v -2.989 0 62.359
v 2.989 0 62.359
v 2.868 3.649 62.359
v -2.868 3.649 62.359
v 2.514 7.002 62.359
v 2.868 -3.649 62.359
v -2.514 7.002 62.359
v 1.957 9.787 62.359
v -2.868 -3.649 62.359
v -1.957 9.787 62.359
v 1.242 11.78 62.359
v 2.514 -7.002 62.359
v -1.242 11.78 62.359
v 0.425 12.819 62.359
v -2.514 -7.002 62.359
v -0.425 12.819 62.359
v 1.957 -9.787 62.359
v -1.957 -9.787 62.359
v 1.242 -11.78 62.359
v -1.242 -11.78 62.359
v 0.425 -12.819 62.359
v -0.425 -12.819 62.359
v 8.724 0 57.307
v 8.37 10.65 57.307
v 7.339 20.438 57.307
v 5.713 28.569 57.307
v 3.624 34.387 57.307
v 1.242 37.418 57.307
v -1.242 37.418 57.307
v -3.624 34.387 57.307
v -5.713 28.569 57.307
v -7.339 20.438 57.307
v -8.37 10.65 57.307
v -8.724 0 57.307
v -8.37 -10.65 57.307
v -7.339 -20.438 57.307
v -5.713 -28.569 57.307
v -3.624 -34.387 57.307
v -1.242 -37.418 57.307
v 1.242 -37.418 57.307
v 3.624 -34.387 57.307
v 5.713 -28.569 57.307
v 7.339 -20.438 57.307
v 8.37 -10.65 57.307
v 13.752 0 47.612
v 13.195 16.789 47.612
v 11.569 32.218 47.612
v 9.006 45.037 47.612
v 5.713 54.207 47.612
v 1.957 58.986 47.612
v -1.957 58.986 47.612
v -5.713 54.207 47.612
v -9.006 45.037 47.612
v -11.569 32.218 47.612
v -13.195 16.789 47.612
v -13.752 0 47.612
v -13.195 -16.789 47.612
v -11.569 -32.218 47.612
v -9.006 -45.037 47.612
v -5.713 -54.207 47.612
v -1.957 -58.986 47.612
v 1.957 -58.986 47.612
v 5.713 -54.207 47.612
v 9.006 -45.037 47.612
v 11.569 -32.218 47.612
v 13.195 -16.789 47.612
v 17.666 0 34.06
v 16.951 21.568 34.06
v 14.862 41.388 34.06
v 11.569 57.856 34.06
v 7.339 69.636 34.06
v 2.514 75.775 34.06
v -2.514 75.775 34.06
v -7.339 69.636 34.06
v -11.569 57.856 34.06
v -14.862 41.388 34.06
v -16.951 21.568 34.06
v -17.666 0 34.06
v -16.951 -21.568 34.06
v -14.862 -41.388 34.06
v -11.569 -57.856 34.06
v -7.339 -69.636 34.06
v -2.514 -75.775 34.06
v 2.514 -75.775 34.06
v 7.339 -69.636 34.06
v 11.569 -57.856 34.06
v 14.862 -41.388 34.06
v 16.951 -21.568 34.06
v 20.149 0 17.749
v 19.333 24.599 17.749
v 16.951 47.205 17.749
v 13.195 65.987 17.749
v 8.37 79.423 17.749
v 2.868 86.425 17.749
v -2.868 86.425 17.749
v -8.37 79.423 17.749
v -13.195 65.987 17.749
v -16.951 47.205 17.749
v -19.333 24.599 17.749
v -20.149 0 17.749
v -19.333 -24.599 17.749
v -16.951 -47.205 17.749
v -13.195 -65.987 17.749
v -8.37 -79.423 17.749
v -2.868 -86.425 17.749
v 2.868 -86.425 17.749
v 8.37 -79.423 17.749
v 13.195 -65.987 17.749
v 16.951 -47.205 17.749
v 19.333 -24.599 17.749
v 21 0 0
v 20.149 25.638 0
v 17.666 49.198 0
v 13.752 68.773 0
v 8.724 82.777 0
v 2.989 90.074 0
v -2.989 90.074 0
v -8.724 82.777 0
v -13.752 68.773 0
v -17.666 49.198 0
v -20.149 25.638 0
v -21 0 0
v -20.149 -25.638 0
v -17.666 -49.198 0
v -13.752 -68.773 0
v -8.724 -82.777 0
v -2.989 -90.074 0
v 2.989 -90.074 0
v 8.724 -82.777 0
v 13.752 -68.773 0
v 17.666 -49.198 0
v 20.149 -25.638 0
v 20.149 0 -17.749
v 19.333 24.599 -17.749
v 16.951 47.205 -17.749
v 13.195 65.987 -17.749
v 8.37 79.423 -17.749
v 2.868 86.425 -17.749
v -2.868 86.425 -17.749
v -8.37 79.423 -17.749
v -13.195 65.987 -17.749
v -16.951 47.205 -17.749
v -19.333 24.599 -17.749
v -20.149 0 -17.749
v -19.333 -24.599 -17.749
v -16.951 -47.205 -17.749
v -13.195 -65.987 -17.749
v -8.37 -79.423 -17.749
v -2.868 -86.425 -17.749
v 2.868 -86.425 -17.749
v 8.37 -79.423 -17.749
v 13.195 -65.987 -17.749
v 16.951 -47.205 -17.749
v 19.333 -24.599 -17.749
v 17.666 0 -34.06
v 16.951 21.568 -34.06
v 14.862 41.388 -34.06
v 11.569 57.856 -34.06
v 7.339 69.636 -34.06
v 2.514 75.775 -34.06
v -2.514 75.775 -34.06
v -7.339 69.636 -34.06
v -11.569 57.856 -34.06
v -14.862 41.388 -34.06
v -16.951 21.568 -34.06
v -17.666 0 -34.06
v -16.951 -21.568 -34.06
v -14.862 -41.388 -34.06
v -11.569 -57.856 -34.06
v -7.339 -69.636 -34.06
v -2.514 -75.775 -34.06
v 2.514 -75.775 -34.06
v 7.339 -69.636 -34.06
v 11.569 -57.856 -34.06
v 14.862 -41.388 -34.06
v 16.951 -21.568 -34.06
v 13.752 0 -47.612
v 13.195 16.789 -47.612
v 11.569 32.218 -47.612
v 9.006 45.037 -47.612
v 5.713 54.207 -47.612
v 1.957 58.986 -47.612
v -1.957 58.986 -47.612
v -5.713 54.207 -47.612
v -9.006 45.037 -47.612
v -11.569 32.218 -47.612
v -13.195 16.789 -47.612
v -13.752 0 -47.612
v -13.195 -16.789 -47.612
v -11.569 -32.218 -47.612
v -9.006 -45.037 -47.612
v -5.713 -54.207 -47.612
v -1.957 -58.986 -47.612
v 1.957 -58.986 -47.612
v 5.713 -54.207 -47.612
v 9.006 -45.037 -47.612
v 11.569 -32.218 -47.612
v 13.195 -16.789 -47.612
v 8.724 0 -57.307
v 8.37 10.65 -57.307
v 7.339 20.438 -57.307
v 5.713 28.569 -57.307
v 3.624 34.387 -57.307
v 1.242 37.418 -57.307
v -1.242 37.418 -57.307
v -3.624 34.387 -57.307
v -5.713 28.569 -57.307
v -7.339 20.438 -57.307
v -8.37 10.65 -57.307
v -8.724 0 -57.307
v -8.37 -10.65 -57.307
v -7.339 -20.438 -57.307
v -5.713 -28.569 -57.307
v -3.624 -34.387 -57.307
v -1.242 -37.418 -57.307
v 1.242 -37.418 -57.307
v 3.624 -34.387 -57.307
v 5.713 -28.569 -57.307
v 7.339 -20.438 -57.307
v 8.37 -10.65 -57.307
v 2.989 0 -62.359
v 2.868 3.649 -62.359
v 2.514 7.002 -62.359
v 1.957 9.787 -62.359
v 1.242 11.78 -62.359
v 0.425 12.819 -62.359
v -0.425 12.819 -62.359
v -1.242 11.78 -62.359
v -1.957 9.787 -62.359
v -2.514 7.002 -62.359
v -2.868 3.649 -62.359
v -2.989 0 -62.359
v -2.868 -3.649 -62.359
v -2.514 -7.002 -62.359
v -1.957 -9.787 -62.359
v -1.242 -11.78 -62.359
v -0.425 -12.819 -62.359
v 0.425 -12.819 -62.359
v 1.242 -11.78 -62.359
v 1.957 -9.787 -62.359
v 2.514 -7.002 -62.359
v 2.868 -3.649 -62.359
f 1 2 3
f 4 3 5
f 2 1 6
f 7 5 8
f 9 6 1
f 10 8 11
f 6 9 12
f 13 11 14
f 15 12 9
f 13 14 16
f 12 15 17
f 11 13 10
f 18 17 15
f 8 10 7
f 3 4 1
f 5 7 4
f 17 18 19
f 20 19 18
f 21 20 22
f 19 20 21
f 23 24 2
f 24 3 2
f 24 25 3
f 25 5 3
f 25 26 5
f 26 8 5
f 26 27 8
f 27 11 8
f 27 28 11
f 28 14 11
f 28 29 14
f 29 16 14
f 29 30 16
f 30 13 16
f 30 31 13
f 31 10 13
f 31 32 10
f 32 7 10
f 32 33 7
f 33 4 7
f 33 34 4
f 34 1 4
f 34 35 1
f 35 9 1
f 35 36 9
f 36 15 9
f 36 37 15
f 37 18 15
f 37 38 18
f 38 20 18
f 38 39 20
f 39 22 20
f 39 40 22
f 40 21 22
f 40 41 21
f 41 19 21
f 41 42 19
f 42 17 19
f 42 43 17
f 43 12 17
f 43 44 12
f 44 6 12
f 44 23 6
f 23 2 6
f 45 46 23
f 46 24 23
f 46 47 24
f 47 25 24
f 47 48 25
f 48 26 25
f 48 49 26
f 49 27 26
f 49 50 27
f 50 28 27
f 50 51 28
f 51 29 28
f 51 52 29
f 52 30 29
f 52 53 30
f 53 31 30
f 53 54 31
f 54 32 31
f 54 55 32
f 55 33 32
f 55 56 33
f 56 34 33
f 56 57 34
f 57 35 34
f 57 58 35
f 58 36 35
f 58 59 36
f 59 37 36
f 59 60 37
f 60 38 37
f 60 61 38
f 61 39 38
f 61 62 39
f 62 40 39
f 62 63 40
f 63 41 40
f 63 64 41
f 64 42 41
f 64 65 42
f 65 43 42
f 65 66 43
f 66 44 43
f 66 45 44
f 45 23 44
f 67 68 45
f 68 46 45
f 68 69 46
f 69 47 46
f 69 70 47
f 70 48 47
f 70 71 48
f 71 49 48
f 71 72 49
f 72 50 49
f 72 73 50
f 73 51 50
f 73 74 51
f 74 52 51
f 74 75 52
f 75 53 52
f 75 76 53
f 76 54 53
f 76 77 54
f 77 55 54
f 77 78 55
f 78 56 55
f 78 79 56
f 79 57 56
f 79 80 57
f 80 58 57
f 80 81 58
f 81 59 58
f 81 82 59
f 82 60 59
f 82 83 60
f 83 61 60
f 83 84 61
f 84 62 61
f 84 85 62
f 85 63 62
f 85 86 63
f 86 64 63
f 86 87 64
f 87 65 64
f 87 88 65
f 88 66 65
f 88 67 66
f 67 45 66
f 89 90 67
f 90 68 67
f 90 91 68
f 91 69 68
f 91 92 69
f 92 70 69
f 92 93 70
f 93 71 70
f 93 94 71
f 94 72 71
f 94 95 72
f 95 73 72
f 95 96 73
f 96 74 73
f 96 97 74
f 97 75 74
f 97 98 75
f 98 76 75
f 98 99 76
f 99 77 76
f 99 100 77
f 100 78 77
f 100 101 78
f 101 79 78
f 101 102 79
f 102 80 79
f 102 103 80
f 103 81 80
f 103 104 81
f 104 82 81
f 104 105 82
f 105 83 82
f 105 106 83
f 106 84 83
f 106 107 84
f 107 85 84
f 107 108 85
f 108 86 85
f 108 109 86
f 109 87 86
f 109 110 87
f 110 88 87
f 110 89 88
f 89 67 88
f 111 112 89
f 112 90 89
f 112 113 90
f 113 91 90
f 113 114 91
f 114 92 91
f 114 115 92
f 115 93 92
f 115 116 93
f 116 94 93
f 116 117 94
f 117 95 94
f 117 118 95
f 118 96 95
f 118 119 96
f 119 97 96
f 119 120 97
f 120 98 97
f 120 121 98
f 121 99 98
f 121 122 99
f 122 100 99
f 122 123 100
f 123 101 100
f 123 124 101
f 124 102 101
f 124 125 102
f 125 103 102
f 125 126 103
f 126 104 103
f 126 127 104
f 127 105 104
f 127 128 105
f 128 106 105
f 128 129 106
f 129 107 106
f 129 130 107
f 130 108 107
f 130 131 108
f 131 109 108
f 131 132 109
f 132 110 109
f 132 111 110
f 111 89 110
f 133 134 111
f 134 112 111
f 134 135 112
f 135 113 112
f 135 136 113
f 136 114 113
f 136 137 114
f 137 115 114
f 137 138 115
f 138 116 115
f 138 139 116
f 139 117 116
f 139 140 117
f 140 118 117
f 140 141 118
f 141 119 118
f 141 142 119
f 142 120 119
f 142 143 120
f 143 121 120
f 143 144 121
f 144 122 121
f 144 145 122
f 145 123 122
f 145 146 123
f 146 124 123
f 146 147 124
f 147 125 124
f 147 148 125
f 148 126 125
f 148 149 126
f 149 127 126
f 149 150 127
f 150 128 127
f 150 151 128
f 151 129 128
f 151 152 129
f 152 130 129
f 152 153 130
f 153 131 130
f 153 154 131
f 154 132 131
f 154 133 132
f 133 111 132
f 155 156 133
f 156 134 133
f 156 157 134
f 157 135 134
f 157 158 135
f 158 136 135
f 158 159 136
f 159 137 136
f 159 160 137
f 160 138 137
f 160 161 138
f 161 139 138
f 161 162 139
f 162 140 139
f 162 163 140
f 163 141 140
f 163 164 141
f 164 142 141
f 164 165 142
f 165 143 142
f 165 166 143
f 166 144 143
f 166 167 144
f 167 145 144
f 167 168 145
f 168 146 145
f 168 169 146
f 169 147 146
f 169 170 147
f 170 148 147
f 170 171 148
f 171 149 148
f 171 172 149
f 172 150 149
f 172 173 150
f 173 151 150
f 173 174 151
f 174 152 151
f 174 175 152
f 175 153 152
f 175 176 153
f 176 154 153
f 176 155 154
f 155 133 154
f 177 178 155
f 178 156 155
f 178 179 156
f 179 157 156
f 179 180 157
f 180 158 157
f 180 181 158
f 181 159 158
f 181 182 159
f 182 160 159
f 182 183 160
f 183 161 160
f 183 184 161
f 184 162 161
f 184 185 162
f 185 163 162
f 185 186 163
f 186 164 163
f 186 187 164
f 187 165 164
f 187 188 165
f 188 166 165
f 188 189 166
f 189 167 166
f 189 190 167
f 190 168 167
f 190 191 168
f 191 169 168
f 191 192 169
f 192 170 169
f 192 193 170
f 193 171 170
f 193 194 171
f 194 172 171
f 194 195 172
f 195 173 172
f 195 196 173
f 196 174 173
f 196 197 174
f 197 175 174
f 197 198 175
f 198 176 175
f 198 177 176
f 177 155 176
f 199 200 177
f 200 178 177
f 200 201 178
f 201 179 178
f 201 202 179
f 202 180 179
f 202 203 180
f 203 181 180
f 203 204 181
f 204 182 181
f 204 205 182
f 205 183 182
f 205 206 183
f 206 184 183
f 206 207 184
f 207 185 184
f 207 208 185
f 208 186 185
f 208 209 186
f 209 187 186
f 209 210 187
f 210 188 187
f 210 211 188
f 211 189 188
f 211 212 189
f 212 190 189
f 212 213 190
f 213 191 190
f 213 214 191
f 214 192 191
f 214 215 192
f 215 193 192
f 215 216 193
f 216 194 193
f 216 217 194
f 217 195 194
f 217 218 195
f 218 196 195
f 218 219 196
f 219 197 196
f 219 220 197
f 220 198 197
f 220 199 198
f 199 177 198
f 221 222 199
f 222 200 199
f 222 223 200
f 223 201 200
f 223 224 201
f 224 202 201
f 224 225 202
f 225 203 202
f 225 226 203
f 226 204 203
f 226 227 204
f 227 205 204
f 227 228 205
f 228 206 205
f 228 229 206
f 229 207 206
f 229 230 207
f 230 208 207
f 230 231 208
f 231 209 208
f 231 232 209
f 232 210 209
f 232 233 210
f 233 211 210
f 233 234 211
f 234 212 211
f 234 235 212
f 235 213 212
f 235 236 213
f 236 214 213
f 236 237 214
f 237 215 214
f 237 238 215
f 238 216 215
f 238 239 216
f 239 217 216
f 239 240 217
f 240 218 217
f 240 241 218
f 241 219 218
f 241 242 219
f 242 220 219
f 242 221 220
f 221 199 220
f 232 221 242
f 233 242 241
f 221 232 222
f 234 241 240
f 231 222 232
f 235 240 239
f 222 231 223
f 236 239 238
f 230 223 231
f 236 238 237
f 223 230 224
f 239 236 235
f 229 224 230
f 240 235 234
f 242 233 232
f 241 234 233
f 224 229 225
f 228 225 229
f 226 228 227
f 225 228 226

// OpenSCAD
// Generated by SolidPython 1.0.1 on 2020-07-29 00:46:45


scale(v = [3, 13, 9]) {
	sphere(r = 7);
}
/***********************************************
*********      SolidPython code:      **********
************************************************
 
# import packages: SolidPython
from solid import *
from solid.utils import *
from itertools import chain, combinations, permutations


class Resize:

    def __init__(self, scad_file):
        self.scad_file = scad_file
        #self.scad_file = import_scad(scad_file)
        # cone/cylinder param:
        self.r1 = 0
        self.r2 = 0
        self.h = 0
        # rectangular prism param:
        self.w = 0
        self.l = 0
        # ellipse param:
        self.r = 0

    # import OpenScad code (file name corresponds to shape)


    # classify shape + parameters
    def assign(self, param1, param2, param3):
        if self.scad_file == 'cone.scad':
            self.r1 = param1
            self.r2 = param2
            self.h = param3
        elif self.scad_file == 'cylinder.scad':
            self.r1 = param1
            self.r2 = param2
            self.h = param3
        elif self.scad_file == 'rectangularPrism.scad':
            self.h = param1
            self.l = param2
            self.w = param3
        else:
            self.r = param1
            self.h = param2

    # resize parameters
    def iterate(self):
        x = range(3, 20, 2)
        i = 1
        if self.scad_file == 'cone.scad':
            tempList = list(permutations(x, 2))
            for temp in tempList:
                param1 = temp[0]
                param2 = temp[1]
                filepath = 'produced_scad_files/' + 'cone' + str(param1) + '_' + str(param2) + '_' + '.scad'
                scad_render_to_file(cylinder(h=param1, r1=param2, r2=0), filepath)

        elif self.scad_file == 'cylinder.scad':
            tempList = list(permutations(x, 3))
            for temp in tempList:
                param1 = temp[0]
                param2 = temp[1]
                filepath = 'produced_scad_files/' + 'cylinder' + str(param1) + '_' + str(param2) + '_' + '.scad'
                scad_render_to_file(cylinder(h=param1, r1=param2, r2=param2), filepath)

        elif self.scad_file == 'rectangularPrism.scad':
            tempList = list(permutations(x, 3))
            for temp in tempList:
                param1 = temp[0]
                param2 = temp[1]
                param3 = temp[2]
                filepath = 'produced_scad_files/' + 'rectangularPrism' + str(param1) + '_' + str(param2) + '_' + str(
                    param3) + '.scad'
                scad_render_to_file(cube(size=(param1, param2, param3)), filepath)

        elif self.scad_file == 'ellipse.scad':
            tempList = list(permutations(x, 4))
            for temp in tempList:
                param1 = temp[0]
                param2 = temp[1]
                param3 = temp[2]
                param4 = temp[3]
                filepath = 'produced_scad_files/' + 'ellipse' + str(param1) + '_' + str(param2) + '_' + str(param3) + '_' + str(param4) + '.scad'
                scad_render_to_file(scale([param1, param2, param3])(sphere(r=param4)), filepath)

    def render_to_scadfile(self):
        scad_render_to_file(scad, 'example.scad') 
 
************************************************/
